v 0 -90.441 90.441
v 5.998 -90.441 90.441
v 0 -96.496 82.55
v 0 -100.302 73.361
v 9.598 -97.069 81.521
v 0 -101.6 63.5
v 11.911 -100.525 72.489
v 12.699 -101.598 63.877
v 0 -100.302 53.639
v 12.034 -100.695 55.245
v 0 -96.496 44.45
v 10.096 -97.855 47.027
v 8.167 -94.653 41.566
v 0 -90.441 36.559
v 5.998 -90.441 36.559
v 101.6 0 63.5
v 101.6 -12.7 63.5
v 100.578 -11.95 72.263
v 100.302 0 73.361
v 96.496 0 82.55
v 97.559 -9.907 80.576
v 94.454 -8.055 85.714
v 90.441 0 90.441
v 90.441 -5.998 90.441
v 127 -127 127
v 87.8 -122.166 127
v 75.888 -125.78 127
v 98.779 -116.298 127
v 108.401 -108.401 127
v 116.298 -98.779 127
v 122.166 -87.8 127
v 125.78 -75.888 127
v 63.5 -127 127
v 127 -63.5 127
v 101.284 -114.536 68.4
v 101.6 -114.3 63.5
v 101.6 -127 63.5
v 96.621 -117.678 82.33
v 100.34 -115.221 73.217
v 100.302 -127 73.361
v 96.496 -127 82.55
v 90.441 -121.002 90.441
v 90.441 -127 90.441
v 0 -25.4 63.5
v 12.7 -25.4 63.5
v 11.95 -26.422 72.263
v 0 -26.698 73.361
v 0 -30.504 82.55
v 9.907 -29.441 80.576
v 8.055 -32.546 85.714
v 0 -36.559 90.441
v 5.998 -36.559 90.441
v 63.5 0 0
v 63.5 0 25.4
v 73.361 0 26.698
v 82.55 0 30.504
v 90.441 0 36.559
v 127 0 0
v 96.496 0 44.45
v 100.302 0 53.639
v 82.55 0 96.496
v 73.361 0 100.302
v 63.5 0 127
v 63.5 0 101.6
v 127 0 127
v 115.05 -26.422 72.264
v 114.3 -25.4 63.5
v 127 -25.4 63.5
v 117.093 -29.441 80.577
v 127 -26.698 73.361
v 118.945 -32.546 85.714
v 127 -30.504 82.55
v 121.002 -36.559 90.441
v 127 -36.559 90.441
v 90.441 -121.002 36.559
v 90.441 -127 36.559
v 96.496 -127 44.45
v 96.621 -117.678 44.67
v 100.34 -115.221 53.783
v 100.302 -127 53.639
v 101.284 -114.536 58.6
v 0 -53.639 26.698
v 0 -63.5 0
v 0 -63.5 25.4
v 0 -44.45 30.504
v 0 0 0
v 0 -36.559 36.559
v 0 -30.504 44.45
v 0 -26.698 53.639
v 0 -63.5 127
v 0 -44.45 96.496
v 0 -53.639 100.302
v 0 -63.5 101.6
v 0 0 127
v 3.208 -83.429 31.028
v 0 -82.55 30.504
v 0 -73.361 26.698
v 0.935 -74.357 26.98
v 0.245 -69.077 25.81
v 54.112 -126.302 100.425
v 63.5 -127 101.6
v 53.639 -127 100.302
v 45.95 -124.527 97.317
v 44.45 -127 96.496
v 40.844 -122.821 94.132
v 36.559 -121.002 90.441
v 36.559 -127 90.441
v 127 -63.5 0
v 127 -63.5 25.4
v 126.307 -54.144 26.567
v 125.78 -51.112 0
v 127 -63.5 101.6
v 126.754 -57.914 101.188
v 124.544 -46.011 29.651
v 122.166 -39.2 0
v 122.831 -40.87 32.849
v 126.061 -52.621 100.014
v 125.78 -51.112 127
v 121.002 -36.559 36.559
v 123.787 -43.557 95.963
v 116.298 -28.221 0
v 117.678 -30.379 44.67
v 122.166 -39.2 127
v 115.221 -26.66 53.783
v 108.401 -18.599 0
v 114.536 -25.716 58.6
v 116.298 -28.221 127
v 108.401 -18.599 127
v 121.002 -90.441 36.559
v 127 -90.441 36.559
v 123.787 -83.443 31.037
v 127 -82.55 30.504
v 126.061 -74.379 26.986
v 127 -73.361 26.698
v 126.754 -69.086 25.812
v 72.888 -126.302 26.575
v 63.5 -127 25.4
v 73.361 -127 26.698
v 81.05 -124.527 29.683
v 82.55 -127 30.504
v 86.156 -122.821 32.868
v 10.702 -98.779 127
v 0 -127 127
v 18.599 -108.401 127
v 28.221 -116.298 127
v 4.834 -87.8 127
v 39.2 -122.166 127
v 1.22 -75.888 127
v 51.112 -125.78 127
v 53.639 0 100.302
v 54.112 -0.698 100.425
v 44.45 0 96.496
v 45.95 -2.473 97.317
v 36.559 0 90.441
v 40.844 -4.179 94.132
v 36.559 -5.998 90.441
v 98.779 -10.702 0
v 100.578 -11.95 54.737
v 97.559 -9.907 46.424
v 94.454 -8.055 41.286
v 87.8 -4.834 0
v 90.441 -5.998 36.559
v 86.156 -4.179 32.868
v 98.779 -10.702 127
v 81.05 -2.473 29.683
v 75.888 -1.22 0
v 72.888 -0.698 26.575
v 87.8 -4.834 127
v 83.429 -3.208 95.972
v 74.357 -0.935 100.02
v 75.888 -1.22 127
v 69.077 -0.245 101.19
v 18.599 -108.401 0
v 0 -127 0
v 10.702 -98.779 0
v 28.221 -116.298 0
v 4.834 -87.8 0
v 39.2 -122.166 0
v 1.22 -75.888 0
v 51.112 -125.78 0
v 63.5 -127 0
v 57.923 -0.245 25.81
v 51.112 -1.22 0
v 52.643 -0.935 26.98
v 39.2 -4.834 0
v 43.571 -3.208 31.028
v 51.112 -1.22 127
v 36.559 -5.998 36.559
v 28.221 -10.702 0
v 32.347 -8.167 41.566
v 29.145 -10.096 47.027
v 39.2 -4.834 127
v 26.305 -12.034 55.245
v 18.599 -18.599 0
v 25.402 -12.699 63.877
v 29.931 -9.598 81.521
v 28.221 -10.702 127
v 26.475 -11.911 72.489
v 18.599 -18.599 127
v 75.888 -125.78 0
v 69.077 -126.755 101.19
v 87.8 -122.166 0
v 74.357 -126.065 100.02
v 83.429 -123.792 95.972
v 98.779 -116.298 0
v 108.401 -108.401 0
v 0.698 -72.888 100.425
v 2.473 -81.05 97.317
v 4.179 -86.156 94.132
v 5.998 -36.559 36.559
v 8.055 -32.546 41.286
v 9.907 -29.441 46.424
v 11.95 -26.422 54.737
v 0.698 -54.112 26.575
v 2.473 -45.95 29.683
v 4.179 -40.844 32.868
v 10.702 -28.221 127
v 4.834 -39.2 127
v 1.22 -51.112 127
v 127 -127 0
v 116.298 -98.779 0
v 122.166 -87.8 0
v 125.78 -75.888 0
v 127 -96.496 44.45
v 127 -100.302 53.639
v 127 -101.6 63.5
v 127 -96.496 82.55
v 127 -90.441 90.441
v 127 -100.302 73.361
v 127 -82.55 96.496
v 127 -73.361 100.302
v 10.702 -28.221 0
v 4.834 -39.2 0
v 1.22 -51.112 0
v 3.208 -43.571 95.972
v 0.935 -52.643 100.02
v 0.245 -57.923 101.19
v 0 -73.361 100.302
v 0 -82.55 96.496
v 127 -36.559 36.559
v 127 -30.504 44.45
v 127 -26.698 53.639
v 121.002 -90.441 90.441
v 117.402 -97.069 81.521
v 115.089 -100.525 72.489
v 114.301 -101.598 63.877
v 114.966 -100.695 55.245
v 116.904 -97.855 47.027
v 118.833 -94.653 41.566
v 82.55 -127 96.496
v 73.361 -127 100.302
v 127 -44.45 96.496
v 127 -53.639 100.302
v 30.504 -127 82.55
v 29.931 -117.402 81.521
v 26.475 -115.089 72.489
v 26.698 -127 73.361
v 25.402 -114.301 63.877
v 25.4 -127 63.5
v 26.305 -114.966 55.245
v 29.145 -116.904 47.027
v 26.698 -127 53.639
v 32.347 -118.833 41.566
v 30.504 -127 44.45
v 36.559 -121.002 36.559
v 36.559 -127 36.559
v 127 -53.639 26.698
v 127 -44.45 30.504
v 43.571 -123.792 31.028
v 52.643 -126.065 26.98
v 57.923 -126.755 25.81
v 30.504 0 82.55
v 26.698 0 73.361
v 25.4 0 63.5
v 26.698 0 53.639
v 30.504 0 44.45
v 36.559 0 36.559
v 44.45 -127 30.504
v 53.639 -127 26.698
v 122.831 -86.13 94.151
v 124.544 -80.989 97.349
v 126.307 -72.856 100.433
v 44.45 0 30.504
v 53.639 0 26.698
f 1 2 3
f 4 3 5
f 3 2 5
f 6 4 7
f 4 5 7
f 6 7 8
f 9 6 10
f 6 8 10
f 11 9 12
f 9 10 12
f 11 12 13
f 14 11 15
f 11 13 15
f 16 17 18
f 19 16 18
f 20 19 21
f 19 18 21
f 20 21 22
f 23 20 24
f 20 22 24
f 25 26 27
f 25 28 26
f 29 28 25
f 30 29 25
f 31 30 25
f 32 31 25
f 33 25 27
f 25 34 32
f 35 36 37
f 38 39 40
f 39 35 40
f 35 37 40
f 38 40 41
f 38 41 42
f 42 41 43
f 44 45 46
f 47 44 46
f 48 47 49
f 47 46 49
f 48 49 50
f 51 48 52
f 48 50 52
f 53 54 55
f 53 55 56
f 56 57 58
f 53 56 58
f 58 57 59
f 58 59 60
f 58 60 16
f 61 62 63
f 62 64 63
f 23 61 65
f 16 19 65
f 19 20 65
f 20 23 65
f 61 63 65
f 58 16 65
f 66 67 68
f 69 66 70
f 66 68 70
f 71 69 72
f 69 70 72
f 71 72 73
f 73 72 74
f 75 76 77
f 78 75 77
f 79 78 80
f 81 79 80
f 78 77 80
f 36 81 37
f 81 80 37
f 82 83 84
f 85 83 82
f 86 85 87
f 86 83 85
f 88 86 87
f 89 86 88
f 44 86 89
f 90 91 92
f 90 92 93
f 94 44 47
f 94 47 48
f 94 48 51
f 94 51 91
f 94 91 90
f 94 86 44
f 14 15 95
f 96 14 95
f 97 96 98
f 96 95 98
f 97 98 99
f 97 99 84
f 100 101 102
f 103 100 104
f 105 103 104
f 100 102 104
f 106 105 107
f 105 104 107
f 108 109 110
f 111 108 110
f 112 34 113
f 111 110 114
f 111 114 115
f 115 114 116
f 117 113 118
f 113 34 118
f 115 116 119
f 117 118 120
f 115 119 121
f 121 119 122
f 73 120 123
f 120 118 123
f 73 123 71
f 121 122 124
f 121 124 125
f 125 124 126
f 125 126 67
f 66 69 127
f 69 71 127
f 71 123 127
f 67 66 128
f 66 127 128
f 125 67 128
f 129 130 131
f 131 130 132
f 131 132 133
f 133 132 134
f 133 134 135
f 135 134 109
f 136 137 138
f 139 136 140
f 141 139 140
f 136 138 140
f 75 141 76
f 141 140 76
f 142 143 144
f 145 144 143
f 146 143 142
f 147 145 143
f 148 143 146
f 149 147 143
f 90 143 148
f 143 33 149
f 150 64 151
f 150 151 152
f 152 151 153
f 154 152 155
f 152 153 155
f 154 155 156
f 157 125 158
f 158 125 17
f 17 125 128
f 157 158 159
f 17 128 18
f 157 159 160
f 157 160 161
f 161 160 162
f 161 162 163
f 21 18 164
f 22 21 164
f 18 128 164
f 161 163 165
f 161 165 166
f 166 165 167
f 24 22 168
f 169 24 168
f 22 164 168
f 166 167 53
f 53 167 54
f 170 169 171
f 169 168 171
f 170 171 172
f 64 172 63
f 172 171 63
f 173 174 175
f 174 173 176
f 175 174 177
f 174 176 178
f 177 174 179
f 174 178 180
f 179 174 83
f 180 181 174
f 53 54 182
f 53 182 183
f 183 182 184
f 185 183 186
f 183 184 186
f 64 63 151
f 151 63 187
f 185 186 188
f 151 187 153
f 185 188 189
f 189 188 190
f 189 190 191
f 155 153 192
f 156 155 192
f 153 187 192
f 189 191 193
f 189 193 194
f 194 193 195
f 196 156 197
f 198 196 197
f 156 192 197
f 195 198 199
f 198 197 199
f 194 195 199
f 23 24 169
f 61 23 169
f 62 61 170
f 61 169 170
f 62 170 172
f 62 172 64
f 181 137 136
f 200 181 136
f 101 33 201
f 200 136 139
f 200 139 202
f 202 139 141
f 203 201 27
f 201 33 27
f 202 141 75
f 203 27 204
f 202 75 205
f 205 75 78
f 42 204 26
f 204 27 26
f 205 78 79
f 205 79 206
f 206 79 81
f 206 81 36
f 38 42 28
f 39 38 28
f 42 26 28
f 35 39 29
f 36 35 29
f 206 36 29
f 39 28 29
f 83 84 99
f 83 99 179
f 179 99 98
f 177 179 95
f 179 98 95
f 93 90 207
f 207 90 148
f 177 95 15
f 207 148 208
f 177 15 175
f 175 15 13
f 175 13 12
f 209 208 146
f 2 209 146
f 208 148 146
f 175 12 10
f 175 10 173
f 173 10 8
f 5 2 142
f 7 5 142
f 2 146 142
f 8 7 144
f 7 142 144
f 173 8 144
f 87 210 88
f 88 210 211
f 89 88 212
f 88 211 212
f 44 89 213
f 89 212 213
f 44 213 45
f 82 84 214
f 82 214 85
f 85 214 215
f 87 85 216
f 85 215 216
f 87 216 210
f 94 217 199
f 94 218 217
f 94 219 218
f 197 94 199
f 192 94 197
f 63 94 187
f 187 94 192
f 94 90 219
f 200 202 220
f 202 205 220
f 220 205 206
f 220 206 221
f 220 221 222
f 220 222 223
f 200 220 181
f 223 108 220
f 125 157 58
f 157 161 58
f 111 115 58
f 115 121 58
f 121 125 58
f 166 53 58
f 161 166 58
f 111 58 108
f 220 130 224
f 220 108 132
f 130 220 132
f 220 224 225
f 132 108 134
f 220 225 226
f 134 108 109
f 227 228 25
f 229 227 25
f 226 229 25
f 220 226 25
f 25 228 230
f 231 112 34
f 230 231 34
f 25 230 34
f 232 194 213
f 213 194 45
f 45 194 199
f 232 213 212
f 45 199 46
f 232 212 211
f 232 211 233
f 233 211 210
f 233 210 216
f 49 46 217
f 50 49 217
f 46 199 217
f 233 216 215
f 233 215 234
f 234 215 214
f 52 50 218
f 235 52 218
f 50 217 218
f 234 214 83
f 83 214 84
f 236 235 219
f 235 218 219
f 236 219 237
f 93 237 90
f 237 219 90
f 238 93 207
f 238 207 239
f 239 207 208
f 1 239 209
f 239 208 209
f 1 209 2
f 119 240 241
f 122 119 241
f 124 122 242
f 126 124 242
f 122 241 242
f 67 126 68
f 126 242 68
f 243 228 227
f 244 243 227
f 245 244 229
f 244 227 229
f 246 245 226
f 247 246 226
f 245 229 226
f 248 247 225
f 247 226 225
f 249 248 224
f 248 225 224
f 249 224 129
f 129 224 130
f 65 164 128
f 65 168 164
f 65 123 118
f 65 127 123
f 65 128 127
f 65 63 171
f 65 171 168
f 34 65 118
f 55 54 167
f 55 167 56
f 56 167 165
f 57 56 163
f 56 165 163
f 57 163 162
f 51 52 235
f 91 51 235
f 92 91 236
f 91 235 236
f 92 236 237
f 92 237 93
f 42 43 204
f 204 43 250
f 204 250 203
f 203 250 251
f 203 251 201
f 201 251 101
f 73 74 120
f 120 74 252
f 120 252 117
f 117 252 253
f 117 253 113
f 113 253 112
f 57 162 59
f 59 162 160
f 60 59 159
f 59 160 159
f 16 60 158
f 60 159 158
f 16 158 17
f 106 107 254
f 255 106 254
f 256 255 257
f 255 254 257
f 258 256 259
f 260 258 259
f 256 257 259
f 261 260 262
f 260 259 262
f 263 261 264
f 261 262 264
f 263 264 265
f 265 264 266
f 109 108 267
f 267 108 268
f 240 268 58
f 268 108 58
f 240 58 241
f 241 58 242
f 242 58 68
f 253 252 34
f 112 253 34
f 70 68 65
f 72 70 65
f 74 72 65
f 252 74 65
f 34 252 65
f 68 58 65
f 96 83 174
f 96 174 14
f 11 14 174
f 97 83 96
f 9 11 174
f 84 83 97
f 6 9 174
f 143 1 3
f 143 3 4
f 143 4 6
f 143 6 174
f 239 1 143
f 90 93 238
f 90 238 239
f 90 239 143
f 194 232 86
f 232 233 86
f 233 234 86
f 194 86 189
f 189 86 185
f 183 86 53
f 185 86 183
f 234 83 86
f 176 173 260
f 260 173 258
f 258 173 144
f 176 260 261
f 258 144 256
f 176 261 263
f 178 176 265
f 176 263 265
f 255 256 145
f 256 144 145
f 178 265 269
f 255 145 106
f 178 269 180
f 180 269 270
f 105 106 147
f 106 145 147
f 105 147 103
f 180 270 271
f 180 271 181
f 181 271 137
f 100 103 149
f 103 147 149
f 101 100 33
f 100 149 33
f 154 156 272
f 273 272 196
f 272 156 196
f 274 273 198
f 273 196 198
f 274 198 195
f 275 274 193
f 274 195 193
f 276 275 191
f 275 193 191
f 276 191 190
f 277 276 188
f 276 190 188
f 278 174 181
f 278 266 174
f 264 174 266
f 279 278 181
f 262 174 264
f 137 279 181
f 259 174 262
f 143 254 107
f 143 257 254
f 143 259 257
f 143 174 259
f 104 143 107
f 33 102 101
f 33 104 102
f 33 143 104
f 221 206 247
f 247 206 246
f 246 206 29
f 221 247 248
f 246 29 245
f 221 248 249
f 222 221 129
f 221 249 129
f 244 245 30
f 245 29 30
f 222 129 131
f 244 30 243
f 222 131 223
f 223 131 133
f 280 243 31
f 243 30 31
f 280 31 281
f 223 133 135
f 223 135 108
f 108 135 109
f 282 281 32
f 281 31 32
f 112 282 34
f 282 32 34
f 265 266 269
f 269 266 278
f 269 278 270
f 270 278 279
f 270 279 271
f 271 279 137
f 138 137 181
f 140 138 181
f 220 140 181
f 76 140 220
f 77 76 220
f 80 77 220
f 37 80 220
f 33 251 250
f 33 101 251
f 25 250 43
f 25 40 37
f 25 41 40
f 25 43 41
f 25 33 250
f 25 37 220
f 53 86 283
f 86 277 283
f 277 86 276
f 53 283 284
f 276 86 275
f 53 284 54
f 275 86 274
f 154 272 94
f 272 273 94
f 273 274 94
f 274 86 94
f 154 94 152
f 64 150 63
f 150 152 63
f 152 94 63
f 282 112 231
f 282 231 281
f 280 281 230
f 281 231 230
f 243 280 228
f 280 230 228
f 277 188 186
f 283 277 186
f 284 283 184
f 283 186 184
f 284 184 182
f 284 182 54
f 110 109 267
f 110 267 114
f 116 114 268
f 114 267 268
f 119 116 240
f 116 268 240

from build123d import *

# Parameters (mm, degrees)
F0_W     = 127
F0_H     = 127
F1_DEPTH = 127
F5_DEPTH = 127
F6_DEPTH = 127
F7_DEPTH = 127


with BuildPart() as f1:
    # F0 (on Front) → F1 (new body)
    with BuildSketch(Plane.XZ):
        with Locations((63.5, 63.5)):
            Rectangle(F0_W, F0_H)
    extrude(amount=F1_DEPTH)

    # F3 (on face) → F5 (cut)
    with BuildSketch(Plane.YZ.offset(127)):
        with BuildLine():
            ThreePointArc((-90.4407683632, 90.4407683632), (-101.6, 63.5), (-90.4407683632, 36.5592316368))
            Line((-90.4407683632, 36.5592316368), (-63.5, 63.5))
            Line((-63.5, 63.5), (-90.4407683632, 90.4407683632))
        make_face()
        with BuildLine():
            Line((-63.5, 63.5), (-90.4407683632, 36.5592316368))
            ThreePointArc((-90.4407683632, 36.5592316368), (-63.5, 25.4), (-36.5592316368, 36.5592316368))
            Line((-36.5592316368, 36.5592316368), (-63.5, 63.5))
        make_face()
        with BuildLine():
            Line((-90.4407683632, 90.4407683632), (-63.5, 63.5))
            Line((-63.5, 63.5), (-36.5592316368, 90.4407683632))
            ThreePointArc((-36.5592316368, 90.4407683632), (-63.5, 101.6), (-90.4407683632, 90.4407683632))
        make_face()
        with BuildLine():
            Line((-36.5592316368, 90.4407683632), (-63.5, 63.5))
            Line((-63.5, 63.5), (-36.5592316368, 36.5592316368))
            ThreePointArc((-36.5592316368, 36.5592316368), (-28.3001898113, 48.9197612269), (-25.4, 63.5))
            ThreePointArc((-25.4, 63.5), (-28.3001898113, 78.0802387731), (-36.5592316368, 90.4407683632))
        make_face()
    extrude(amount=-F5_DEPTH, mode=Mode.SUBTRACT)

    # F2 (on face) → F6 (cut)
    with BuildSketch(Plane.XZ.offset(127)):
        with BuildLine():
            ThreePointArc((36.5592316368, 90.4407683632), (25.4, 63.5), (36.5592316368, 36.5592316368))
            Line((36.5592316368, 36.5592316368), (63.5, 63.5))
            Line((63.5, 63.5), (36.5592316368, 90.4407683632))
        make_face()
        with BuildLine():
            Line((63.5, 63.5), (36.5592316368, 36.5592316368))
            ThreePointArc((36.5592316368, 36.5592316368), (63.5, 25.4), (90.4407683632, 36.5592316368))
            Line((90.4407683632, 36.5592316368), (63.5, 63.5))
        make_face()
        with BuildLine():
            Line((36.5592316368, 90.4407683632), (63.5, 63.5))
            Line((63.5, 63.5), (90.4407683632, 90.4407683632))
            ThreePointArc((90.4407683632, 90.4407683632), (63.5, 101.6), (36.5592316368, 90.4407683632))
        make_face()
        with BuildLine():
            Line((90.4407683632, 90.4407683632), (63.5, 63.5))
            Line((63.5, 63.5), (90.4407683632, 36.5592316368))
            ThreePointArc((90.4407683632, 36.5592316368), (98.6998101887, 48.9197612269), (101.6, 63.5))
            ThreePointArc((101.6, 63.5), (98.6998101887, 78.0802387731), (90.4407683632, 90.4407683632))
        make_face()
    extrude(amount=-F6_DEPTH, mode=Mode.SUBTRACT)

    # F4 (on face) → F7 (cut)
    with BuildSketch(Plane.XY.offset(127)):
        with BuildLine():
            ThreePointArc((18.5987193947, -18.5987193947), (0, -63.5), (18.5987193947, -108.4012806053))
            Line((18.5987193947, -108.4012806053), (63.5, -63.5))
            Line((63.5, -63.5), (18.5987193947, -18.5987193947))
        make_face()
        with BuildLine():
            Line((63.5, -63.5), (18.5987193947, -108.4012806053))
            ThreePointArc((18.5987193947, -108.4012806053), (63.5, -127), (108.4012806053, -108.4012806053))
            Line((108.4012806053, -108.4012806053), (63.5, -63.5))
        make_face()
        with BuildLine():
            Line((18.5987193947, -18.5987193947), (63.5, -63.5))
            Line((63.5, -63.5), (108.4012806053, -18.5987193947))
            ThreePointArc((108.4012806053, -18.5987193947), (63.5, 0), (18.5987193947, -18.5987193947))
        make_face()
        with BuildLine():
            Line((108.4012806053, -18.5987193947), (63.5, -63.5))
            Line((63.5, -63.5), (108.4012806053, -108.4012806053))
            ThreePointArc((108.4012806053, -108.4012806053), (122.1663503145, -87.8003979552), (127, -63.5))
            ThreePointArc((127, -63.5), (122.1663503145, -39.1996020448), (108.4012806053, -18.5987193947))
        make_face()
    extrude(amount=-F7_DEPTH, mode=Mode.SUBTRACT)


solid = f1.part
